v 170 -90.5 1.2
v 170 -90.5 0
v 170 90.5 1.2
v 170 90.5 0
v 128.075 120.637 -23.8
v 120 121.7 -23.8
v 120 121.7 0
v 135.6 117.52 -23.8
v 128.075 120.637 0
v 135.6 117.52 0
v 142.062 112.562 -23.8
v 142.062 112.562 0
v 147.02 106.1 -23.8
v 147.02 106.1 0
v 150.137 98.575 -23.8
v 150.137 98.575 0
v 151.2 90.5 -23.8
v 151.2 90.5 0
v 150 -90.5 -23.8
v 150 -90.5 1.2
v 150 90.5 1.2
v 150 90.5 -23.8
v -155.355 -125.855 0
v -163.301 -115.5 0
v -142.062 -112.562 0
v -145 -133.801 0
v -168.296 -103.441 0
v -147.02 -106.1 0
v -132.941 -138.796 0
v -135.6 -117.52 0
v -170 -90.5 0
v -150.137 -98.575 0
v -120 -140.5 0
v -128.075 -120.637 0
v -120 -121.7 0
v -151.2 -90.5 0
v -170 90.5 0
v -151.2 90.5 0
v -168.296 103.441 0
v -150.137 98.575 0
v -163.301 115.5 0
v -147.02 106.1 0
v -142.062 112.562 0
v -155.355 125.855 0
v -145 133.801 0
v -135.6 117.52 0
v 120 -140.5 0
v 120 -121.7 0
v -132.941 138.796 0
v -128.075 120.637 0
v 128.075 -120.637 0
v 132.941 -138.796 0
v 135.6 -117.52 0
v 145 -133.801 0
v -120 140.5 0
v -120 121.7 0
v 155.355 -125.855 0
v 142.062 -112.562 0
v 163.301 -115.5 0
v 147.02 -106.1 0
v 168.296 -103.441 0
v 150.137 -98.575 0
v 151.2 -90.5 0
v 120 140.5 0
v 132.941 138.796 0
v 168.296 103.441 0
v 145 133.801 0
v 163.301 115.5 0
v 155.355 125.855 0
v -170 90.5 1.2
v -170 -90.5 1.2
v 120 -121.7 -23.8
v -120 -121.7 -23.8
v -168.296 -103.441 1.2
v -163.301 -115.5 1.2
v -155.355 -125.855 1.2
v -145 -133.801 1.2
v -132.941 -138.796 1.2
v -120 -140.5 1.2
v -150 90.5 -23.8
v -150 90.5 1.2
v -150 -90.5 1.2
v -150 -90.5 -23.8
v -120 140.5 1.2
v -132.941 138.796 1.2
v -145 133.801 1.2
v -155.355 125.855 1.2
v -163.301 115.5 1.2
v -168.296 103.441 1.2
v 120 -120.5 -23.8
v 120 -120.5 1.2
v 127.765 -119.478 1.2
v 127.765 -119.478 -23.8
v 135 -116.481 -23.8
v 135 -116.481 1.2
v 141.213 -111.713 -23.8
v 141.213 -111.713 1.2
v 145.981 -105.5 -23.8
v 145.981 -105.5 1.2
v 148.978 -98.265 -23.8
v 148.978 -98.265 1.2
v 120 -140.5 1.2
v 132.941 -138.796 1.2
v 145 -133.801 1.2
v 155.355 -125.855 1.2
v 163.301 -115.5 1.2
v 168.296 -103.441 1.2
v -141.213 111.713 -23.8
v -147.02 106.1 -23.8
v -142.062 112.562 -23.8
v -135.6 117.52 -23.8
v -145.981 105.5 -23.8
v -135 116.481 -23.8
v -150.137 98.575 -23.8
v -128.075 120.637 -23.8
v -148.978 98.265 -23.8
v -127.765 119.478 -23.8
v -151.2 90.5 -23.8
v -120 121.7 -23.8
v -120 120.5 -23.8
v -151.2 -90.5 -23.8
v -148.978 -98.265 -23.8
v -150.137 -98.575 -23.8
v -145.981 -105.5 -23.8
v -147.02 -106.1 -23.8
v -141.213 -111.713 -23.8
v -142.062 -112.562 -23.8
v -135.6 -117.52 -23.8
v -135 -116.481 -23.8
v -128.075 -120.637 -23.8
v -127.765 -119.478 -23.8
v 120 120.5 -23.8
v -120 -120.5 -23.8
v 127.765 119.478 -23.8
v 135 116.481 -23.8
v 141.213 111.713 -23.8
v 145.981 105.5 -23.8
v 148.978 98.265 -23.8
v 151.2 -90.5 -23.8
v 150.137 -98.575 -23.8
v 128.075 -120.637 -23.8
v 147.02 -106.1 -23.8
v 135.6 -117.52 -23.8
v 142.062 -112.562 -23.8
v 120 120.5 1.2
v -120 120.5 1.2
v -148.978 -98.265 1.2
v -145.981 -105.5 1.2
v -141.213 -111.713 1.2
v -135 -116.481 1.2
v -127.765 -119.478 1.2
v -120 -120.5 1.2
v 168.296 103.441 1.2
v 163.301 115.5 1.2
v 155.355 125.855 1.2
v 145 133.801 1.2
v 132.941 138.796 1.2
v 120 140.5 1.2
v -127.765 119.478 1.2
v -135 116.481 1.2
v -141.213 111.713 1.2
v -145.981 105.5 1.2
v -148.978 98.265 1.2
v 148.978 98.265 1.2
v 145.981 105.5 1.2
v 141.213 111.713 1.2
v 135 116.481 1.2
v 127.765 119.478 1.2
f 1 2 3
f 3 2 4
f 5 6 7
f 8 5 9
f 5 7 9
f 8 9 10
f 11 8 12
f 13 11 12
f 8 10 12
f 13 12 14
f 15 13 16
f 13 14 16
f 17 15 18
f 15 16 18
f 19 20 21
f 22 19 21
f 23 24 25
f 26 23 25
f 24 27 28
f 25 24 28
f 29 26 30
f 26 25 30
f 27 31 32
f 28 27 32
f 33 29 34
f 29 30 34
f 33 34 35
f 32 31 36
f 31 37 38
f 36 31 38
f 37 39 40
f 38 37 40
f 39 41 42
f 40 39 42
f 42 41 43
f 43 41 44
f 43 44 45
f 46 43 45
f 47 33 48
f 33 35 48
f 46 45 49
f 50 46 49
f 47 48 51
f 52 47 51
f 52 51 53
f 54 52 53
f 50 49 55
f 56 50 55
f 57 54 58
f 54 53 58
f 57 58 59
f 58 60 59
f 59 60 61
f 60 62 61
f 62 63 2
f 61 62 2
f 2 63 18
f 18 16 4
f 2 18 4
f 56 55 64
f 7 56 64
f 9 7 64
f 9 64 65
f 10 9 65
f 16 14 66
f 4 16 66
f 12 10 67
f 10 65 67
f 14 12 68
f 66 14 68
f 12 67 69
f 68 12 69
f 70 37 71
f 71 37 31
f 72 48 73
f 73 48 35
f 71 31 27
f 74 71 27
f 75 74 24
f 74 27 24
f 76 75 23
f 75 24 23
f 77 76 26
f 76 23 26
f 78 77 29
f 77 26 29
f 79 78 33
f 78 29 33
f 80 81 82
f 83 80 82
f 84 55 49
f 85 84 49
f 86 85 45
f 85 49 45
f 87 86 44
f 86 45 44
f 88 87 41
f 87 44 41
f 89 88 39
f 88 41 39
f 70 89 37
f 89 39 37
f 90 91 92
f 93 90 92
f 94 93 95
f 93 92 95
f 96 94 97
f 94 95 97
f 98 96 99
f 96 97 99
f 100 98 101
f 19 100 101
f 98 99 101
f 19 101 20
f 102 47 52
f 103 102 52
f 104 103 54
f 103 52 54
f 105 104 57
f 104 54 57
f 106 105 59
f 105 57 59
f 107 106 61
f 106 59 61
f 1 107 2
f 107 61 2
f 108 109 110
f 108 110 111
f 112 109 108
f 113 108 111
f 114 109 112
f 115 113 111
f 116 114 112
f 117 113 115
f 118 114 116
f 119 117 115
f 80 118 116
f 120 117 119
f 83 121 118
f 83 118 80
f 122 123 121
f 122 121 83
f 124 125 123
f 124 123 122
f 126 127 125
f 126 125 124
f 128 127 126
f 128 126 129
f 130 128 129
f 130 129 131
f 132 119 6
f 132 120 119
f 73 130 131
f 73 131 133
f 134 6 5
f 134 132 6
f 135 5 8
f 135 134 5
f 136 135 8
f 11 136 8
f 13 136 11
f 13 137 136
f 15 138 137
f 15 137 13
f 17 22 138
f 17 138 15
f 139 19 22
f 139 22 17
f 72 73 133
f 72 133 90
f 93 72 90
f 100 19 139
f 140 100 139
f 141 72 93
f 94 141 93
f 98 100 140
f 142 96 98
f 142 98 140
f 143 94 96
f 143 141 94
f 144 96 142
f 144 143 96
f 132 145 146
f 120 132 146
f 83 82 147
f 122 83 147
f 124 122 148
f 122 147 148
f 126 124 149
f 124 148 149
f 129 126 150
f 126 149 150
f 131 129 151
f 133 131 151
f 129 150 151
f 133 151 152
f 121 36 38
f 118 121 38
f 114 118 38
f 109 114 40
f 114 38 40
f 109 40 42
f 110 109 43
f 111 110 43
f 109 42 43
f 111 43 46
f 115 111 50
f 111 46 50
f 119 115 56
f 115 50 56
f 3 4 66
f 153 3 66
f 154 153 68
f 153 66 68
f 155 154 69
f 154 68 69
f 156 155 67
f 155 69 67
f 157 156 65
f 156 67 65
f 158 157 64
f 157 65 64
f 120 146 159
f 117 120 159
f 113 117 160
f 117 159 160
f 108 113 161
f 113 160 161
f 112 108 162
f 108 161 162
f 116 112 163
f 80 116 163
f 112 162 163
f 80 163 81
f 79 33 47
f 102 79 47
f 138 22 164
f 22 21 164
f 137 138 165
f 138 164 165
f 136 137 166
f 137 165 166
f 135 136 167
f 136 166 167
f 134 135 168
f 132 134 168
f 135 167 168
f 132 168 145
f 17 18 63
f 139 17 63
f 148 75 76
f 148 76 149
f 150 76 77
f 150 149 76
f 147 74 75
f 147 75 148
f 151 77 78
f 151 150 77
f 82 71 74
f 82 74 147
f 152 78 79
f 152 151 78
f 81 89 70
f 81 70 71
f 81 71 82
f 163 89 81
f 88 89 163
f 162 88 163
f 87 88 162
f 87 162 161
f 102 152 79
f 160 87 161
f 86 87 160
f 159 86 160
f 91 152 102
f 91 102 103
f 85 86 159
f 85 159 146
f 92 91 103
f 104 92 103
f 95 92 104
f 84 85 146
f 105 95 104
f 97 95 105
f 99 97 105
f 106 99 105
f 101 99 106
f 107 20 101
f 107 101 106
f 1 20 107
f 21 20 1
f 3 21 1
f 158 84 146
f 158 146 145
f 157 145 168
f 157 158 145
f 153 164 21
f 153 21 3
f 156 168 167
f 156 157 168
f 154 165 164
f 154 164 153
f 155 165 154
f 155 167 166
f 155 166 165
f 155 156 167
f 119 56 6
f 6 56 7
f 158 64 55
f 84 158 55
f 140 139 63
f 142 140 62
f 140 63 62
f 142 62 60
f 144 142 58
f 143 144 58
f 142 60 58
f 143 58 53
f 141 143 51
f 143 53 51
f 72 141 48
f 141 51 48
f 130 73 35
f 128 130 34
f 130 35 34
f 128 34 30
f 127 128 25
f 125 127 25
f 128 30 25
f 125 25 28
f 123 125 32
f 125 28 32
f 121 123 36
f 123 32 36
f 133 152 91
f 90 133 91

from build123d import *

# Parameters (mm, degrees)
F1_DEPTH = 1.2
F3_DEPTH = 23.8


with BuildPart() as f1:
    # F0 (on Top) → F1 (new body)
    with BuildSketch(Plane.XY):
        with BuildLine():
            ThreePointArc((170, 90.5), (155.355339, 125.855339), (120, 140.5))
            Line((120, 140.5), (-120, 140.5))
            ThreePointArc((-120, 140.5), (-155.355339, 125.855339), (-170, 90.5))
            Line((-170, 90.5), (-170, -90.5))
            ThreePointArc((-170, -90.5), (-155.355339, -125.855339), (-120, -140.5))
            Line((-120, -140.5), (120, -140.5))
            ThreePointArc((120, -140.5), (155.355339, -125.855339), (170, -90.5))
            Line((170, -90.5), (170, 90.5))
        make_face()
        with BuildLine():
            ThreePointArc((120, 120.5), (141.213203, 111.713203), (150, 90.5))
            Line((150, 90.5), (150, -90.5))
            ThreePointArc((150, -90.5), (141.213203, -111.713203), (120, -120.5))
            Line((120, -120.5), (-120, -120.5))
            ThreePointArc((-120, -120.5), (-141.213203, -111.713203), (-150, -90.5))
            Line((-150, -90.5), (-150, 90.5))
            ThreePointArc((-150, 90.5), (-141.213203, 111.713203), (-120, 120.5))
            Line((-120, 120.5), (120, 120.5))
        make_face(mode=Mode.SUBTRACT)
    extrude(amount=F1_DEPTH)

    # F2 (on face) → F3 (join)
    with BuildSketch(Plane(origin=(0, 0, 0), x_dir=(1, 0, 0), z_dir=(0, 0, -1))):
        with BuildLine():
            ThreePointArc((120, -121.7), (142.061732, -112.561732), (151.2, -90.5))
            Line((151.2, -90.5), (151.2, 90.5))
            ThreePointArc((151.2, 90.5), (142.061732, 112.561732), (120, 121.7))
            Line((120, 121.7), (-120, 121.7))
            ThreePointArc((-120, 121.7), (-142.061732, 112.561732), (-151.2, 90.5))
            Line((-151.2, 90.5), (-151.2, -90.5))
            ThreePointArc((-151.2, -90.5), (-142.061732, -112.561732), (-120, -121.7))
            Line((-120, -121.7), (120, -121.7))
        make_face()
        with BuildLine():
            ThreePointArc((150, -90.5), (141.213203, -111.713203), (120, -120.5))
            Line((120, -120.5), (-120, -120.5))
            ThreePointArc((-120, -120.5), (-141.213203, -111.713203), (-150, -90.5))
            Line((-150, -90.5), (-150, 90.5))
            ThreePointArc((-150, 90.5), (-141.213203, 111.713203), (-120, 120.5))
            Line((-120, 120.5), (120, 120.5))
            ThreePointArc((120, 120.5), (141.213203, 111.713203), (150, 90.5))
            Line((150, 90.5), (150, -90.5))
        make_face(mode=Mode.SUBTRACT)
    extrude(amount=F3_DEPTH)


solid = f1.part
